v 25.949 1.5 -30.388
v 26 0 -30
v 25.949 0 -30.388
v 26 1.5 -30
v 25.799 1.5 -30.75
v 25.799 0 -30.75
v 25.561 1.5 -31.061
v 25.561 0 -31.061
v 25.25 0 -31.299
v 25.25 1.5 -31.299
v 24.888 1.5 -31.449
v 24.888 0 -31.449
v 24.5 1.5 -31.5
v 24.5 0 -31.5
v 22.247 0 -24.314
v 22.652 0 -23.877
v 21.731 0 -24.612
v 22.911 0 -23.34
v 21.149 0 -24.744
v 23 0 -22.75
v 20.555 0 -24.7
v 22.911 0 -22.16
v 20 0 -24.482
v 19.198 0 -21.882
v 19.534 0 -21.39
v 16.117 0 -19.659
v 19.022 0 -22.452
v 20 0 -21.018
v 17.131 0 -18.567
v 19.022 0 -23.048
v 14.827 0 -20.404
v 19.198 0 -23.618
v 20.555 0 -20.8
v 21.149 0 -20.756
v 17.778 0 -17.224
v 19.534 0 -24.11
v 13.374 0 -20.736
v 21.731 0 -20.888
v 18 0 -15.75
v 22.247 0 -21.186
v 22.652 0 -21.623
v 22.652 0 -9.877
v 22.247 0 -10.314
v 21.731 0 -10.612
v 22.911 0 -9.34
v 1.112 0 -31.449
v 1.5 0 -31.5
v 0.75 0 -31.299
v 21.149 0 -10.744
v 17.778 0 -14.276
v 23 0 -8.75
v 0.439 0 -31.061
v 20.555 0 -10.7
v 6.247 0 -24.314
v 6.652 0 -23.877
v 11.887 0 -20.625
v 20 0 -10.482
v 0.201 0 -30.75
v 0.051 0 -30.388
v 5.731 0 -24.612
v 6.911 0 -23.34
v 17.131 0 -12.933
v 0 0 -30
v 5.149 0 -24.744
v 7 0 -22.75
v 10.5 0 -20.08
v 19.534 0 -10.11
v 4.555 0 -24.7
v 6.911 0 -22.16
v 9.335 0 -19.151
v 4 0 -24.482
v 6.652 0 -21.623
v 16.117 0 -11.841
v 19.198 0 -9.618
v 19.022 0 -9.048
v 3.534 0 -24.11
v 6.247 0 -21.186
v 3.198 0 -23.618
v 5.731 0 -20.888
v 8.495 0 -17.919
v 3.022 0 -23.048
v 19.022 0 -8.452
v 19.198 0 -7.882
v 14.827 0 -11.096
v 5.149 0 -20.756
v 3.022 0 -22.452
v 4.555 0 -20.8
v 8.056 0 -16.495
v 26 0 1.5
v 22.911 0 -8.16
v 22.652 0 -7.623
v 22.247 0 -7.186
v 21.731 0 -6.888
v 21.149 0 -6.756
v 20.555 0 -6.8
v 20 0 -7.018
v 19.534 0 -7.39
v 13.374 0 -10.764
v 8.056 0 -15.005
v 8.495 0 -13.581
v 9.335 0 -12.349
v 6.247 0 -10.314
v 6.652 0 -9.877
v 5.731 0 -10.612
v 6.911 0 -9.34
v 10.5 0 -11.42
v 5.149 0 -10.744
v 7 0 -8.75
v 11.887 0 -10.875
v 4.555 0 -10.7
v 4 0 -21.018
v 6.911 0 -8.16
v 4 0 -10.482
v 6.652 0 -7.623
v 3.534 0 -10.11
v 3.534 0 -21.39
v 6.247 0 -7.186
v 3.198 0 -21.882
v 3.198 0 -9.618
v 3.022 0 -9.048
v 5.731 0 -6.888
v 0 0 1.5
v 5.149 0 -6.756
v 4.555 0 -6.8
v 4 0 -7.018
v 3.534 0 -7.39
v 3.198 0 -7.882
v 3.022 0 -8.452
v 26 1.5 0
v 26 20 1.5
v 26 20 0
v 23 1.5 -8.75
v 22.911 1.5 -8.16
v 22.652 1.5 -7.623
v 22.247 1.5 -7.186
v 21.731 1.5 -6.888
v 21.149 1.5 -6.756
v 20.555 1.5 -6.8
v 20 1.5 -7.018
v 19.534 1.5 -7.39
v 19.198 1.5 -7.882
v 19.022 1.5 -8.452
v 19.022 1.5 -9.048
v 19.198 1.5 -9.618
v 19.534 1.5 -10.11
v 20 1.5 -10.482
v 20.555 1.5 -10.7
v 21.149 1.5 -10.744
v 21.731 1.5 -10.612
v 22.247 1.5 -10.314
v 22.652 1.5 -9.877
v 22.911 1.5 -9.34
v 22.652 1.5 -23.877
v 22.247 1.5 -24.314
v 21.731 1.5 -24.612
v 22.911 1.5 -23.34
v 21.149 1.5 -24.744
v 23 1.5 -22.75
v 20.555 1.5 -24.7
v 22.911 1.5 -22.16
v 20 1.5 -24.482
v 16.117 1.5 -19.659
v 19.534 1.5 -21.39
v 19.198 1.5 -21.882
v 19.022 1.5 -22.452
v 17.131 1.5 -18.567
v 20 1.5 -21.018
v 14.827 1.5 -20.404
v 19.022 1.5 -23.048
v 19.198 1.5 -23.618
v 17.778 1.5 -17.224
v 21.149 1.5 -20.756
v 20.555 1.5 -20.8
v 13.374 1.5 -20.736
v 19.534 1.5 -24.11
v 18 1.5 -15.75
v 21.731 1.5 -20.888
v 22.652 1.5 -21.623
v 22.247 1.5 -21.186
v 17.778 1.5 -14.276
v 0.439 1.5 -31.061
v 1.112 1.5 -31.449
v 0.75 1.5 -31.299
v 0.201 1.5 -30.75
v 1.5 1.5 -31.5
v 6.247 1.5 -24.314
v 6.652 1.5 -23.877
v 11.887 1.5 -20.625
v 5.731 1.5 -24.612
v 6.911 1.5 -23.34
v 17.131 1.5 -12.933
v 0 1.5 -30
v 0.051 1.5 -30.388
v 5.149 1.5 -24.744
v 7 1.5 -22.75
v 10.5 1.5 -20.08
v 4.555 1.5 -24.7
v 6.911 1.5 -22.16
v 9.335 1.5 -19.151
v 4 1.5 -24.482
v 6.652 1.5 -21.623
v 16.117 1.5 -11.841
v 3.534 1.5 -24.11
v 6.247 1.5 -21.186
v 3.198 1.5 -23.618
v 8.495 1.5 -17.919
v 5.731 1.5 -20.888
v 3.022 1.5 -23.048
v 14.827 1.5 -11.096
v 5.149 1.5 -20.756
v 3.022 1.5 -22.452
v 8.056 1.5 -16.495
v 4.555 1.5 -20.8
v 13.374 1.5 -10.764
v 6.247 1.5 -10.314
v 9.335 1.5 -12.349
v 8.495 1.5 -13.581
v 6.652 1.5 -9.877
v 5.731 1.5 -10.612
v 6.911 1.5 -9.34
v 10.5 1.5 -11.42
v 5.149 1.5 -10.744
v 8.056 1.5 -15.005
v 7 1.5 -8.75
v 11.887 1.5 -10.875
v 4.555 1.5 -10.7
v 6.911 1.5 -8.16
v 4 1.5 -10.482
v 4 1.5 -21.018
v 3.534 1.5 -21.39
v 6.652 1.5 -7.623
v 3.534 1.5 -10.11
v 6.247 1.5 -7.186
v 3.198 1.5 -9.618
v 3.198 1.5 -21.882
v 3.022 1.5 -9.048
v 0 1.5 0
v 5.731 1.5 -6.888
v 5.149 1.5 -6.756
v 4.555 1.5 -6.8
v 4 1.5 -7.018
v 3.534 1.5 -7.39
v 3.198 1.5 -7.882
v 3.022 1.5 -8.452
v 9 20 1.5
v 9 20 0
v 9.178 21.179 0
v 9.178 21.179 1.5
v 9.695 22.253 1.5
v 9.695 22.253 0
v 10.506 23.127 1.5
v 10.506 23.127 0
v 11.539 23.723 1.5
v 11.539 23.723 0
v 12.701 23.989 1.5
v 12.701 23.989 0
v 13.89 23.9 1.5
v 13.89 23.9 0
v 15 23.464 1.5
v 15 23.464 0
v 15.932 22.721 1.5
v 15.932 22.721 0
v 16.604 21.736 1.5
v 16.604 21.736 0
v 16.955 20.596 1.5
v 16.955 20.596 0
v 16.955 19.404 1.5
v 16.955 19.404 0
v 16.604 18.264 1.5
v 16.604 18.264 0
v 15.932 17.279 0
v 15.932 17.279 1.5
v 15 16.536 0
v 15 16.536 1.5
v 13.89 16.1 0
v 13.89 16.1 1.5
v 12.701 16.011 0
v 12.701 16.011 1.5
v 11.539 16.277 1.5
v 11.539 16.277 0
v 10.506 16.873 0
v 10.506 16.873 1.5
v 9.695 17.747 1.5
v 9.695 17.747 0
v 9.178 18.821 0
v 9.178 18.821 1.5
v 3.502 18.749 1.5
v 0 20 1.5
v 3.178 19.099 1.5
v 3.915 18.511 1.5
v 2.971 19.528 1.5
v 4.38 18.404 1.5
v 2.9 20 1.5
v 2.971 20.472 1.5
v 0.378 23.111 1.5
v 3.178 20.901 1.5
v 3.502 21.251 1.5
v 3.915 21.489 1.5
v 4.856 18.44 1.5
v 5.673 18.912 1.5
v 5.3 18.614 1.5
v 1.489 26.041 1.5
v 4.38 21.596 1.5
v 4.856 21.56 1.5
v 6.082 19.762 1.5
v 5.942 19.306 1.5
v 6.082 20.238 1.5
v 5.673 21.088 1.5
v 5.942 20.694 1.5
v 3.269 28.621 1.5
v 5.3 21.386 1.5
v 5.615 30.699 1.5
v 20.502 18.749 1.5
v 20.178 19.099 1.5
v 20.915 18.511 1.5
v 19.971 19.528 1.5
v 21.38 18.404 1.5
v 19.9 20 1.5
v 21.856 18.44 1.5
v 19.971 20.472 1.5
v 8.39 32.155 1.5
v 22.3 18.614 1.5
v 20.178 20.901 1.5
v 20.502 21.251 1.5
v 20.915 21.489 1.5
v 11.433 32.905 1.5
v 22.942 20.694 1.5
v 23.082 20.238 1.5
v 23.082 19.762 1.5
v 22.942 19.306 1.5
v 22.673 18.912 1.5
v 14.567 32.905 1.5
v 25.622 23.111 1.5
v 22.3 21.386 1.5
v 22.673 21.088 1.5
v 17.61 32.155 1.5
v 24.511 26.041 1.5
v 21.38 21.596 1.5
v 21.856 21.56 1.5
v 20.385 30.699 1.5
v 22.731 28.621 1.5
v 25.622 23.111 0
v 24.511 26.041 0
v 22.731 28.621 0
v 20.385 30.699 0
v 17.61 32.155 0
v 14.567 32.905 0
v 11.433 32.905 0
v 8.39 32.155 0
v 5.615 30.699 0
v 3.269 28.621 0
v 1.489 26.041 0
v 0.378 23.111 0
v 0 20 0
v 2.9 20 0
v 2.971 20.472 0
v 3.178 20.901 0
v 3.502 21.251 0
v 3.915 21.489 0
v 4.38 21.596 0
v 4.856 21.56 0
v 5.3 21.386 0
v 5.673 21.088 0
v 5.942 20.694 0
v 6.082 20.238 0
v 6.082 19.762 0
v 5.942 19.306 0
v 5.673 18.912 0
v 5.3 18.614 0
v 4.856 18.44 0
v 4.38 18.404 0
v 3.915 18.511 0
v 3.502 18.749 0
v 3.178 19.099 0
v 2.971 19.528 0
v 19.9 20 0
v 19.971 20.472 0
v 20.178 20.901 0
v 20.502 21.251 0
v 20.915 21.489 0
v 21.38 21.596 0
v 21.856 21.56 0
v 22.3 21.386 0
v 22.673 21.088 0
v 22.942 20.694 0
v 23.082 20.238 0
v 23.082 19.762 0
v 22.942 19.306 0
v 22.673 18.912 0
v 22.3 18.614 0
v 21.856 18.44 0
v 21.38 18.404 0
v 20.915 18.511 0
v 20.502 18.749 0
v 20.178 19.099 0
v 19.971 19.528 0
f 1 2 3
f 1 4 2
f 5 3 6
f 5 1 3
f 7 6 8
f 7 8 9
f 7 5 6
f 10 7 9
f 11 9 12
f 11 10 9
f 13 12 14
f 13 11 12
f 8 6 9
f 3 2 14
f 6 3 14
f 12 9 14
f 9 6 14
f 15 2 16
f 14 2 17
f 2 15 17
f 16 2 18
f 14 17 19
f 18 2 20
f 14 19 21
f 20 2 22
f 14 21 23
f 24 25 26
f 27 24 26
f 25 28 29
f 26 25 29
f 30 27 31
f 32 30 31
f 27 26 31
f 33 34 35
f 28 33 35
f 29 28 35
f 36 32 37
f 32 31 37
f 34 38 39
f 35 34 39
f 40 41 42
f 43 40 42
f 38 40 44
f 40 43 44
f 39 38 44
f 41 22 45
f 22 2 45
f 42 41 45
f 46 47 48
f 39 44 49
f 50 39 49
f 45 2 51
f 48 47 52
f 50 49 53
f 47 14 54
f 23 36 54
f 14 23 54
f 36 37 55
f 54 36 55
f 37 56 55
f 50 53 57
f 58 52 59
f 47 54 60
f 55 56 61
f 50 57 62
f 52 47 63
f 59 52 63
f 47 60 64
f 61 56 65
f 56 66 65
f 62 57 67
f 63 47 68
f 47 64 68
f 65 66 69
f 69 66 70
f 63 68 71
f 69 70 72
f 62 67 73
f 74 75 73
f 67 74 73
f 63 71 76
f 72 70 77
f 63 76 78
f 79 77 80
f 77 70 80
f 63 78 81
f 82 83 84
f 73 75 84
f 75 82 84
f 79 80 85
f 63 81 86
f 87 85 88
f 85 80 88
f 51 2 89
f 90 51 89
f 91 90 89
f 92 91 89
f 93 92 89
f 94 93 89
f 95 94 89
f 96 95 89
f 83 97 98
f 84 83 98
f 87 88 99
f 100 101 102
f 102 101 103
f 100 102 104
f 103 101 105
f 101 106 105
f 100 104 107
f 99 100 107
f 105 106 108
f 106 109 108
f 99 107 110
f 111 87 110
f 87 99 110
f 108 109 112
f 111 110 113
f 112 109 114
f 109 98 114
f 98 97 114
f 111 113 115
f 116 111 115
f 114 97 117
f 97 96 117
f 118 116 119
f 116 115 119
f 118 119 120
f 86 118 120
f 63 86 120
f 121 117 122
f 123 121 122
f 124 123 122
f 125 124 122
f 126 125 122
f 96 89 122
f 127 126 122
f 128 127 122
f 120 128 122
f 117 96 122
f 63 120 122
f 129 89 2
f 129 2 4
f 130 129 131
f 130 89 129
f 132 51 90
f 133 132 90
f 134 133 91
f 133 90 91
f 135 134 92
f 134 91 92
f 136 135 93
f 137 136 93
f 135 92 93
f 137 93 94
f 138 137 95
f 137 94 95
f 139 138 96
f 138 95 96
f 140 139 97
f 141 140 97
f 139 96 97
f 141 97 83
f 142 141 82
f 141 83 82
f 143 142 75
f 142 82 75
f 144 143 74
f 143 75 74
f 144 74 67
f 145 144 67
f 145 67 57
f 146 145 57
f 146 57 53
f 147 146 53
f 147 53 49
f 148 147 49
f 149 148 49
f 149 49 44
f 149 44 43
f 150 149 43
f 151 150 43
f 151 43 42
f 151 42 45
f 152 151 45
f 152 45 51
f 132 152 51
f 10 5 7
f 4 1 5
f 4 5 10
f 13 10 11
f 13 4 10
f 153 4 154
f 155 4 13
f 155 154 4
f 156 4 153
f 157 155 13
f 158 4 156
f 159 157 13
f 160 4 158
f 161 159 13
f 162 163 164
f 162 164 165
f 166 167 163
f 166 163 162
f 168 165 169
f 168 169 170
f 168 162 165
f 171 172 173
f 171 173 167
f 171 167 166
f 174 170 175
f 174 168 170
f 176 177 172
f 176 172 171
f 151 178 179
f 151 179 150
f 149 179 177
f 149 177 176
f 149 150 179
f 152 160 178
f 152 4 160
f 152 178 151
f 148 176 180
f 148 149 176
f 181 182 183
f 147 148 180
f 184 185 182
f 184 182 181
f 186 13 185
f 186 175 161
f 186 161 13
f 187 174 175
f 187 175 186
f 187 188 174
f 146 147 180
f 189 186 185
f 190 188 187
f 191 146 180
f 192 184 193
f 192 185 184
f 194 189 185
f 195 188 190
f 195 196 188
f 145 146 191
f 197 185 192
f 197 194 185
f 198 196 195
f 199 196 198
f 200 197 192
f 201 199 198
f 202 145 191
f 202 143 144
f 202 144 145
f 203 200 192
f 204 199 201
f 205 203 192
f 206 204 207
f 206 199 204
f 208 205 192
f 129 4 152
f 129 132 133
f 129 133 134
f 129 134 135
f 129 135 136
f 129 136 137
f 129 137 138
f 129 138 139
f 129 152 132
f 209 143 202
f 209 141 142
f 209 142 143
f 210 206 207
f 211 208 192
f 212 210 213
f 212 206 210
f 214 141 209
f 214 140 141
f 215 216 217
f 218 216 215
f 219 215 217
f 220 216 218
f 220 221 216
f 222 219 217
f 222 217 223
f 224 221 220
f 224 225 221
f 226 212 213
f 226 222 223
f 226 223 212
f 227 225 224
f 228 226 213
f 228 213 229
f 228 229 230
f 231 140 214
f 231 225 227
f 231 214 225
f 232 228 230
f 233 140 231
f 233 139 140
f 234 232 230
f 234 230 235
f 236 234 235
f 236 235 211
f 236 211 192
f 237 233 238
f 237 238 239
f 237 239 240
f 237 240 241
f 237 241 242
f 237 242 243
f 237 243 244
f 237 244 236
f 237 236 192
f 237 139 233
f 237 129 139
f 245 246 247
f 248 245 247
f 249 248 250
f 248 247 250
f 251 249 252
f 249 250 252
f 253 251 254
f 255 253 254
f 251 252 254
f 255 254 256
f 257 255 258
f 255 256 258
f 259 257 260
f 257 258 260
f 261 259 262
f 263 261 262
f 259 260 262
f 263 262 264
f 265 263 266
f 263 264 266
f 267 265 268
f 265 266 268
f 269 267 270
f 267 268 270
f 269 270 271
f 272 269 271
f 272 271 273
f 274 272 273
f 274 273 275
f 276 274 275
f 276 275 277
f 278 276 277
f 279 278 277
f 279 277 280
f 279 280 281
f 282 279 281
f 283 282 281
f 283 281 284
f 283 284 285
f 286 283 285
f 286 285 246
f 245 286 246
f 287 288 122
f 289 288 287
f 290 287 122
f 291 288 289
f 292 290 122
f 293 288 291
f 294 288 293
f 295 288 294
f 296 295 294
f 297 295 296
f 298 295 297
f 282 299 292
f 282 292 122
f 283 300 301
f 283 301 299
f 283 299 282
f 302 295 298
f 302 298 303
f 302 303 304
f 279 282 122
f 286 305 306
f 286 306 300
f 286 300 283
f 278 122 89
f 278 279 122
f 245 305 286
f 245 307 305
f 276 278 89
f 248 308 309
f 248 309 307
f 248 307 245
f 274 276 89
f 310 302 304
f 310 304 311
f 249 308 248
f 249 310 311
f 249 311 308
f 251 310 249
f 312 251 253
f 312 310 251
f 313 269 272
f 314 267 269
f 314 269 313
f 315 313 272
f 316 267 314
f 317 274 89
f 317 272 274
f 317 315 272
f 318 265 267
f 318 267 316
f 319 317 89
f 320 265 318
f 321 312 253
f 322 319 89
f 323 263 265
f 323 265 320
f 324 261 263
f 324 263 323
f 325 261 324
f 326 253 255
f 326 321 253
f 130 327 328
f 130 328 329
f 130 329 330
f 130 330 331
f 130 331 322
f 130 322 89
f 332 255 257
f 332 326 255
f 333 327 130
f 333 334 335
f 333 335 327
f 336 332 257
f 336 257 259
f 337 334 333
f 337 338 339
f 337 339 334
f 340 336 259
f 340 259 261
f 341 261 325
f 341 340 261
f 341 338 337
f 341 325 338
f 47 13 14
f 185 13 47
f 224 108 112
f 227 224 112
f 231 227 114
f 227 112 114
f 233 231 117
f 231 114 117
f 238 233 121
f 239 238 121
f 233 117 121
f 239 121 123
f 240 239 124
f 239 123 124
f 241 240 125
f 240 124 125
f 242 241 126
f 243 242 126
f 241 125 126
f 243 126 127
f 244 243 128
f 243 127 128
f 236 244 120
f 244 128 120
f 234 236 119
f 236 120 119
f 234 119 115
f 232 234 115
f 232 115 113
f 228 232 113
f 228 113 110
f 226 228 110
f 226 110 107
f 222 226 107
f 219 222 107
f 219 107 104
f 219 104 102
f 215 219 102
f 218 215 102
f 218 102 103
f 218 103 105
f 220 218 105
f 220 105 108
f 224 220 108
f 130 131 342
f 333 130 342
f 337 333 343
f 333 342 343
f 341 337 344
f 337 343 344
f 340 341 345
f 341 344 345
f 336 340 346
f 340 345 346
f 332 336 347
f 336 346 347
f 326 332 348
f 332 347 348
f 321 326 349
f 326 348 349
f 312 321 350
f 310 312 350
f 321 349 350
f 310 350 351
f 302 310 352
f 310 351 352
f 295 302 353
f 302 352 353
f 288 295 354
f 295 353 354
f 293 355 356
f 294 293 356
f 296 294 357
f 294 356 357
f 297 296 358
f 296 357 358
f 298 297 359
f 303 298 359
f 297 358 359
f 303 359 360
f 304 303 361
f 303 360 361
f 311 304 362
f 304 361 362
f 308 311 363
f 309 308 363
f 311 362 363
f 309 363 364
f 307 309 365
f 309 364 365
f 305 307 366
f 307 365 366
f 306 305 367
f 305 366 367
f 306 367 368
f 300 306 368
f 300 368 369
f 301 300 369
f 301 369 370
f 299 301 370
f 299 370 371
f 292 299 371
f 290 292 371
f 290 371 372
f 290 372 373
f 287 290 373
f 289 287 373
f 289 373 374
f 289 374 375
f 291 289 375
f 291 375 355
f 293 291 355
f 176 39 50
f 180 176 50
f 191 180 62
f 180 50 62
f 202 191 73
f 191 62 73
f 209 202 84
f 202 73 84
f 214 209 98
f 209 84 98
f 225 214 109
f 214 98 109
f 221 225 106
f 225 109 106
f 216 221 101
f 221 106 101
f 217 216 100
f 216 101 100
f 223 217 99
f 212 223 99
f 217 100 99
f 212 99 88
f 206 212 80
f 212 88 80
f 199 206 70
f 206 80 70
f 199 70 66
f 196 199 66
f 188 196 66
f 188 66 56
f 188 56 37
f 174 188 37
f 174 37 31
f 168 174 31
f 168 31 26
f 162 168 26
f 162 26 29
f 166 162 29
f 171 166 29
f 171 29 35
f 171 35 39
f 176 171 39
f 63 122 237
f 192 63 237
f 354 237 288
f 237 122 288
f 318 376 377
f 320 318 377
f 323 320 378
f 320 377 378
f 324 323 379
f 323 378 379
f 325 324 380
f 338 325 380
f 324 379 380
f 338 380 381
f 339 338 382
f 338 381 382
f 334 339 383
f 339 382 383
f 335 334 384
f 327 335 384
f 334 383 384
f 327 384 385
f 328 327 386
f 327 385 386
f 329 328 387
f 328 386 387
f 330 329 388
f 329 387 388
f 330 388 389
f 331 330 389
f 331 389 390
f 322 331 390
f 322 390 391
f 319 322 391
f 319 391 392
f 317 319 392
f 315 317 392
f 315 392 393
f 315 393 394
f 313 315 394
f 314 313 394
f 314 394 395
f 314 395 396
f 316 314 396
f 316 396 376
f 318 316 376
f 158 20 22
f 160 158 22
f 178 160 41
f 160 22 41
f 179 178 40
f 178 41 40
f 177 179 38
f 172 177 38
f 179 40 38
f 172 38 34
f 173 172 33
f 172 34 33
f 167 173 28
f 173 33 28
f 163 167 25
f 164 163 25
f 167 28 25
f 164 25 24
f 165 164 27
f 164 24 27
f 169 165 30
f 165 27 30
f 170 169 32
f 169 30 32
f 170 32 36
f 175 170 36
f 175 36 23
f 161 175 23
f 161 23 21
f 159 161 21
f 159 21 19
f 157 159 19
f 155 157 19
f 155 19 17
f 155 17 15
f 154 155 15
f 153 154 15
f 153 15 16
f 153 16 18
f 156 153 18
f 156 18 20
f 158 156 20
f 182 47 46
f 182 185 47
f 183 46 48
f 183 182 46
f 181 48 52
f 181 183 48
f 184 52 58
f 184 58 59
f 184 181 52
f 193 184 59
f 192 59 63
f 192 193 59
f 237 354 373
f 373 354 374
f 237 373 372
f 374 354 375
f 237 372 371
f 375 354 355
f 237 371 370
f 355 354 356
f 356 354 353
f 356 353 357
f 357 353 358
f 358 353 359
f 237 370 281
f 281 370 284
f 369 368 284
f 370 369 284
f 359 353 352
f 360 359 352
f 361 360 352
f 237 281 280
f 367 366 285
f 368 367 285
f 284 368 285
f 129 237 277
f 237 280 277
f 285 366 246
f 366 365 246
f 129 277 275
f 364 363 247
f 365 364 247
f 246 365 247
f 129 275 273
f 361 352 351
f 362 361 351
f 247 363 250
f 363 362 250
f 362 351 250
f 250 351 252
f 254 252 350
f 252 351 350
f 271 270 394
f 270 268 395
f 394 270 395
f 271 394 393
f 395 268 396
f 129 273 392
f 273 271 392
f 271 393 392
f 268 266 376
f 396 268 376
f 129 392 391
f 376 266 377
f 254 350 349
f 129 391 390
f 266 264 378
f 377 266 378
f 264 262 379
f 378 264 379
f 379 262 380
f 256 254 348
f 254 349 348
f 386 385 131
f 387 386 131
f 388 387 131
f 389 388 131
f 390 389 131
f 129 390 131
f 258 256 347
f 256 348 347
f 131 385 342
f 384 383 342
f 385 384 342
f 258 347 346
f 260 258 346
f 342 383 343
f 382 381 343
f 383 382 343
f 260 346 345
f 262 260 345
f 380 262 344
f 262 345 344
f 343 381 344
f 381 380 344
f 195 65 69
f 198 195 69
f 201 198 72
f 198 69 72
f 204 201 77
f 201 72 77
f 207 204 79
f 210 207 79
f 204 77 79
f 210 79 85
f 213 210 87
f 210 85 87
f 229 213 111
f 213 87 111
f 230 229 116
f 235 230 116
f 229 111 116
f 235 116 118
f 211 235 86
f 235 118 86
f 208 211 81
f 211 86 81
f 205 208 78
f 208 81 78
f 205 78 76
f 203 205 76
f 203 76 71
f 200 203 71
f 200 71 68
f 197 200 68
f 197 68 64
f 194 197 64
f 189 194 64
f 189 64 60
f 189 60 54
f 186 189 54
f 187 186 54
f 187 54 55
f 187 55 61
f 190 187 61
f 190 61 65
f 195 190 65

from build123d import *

# Parameters (mm, degrees)
BOSS_EXTRUDE1_DEPTH = 1.5
SKETCH2_R           = 4
SKETCH2_R_2         = 1.6
CUT_EXTRUDE1_DEPTH  = 2.5
SKETCH3_W           = 26
SKETCH3_H           = 1.5
BOSS_EXTRUDE4_DEPTH = 31.5
SKETCH4_R           = 5
SKETCH4_R_2         = 2
CUT_EXTRUDE2_DEPTH  = 34
FILLET1_R           = 1.5


with BuildPart() as part:
    # Sketch1 → Boss-Extrude1 (new body)
    with BuildSketch(Plane.XY):
        with BuildLine():
            Line((0, 0), (26, 0))
            Line((26, 0), (26, 20))
            ThreePointArc((26, 20), (13, 33), (0, 20))
            Line((0, 20), (0, 0))
        make_face()
    extrude(amount=BOSS_EXTRUDE1_DEPTH)

    # Sketch2 → Cut-Extrude1 (cut, through all)
    with BuildSketch(Plane(origin=(0, 0, 0), x_dir=(-1, 0, 0), z_dir=(0, 0, -1))):
        with Locations((-13, 20)):
            Circle(SKETCH2_R)
        with Locations((-21.5, 20)):
            Circle(SKETCH2_R_2)
        with Locations((-4.5, 20)):
            Circle(SKETCH2_R_2)
    extrude(amount=-CUT_EXTRUDE1_DEPTH, mode=Mode.SUBTRACT)

    # Sketch3 → Boss-Extrude4 (add)
    with BuildSketch(Plane(origin=(0, 0, 0), x_dir=(-1, 0, 0), z_dir=(0, 0, -1))):
        with Locations((-13, 0.75)):
            Rectangle(SKETCH3_W, SKETCH3_H)
    extrude(amount=BOSS_EXTRUDE4_DEPTH)

    # Sketch4 → Cut-Extrude2 (cut, through all)
    with BuildSketch(Plane.XZ):
        with Locations((13, -15.75)):
            Circle(SKETCH4_R)
        with Locations((5, -8.75)):
            Circle(SKETCH4_R_2)
        with Locations((21, -8.75)):
            Circle(SKETCH4_R_2)
        with Locations((21, -22.75)):
            Circle(SKETCH4_R_2)
        with Locations((5, -22.75)):
            Circle(SKETCH4_R_2)
    extrude(amount=-CUT_EXTRUDE2_DEPTH, mode=Mode.SUBTRACT)

    # Fillet1
    fillet1_edges = [part.edges().sort_by_distance(p)[0] for p in [
        (26, 0.75, -31.5),
        (0, 0.75, -31.5),
    ]]
    fillet(fillet1_edges, radius=FILLET1_R)


solid = part.part
